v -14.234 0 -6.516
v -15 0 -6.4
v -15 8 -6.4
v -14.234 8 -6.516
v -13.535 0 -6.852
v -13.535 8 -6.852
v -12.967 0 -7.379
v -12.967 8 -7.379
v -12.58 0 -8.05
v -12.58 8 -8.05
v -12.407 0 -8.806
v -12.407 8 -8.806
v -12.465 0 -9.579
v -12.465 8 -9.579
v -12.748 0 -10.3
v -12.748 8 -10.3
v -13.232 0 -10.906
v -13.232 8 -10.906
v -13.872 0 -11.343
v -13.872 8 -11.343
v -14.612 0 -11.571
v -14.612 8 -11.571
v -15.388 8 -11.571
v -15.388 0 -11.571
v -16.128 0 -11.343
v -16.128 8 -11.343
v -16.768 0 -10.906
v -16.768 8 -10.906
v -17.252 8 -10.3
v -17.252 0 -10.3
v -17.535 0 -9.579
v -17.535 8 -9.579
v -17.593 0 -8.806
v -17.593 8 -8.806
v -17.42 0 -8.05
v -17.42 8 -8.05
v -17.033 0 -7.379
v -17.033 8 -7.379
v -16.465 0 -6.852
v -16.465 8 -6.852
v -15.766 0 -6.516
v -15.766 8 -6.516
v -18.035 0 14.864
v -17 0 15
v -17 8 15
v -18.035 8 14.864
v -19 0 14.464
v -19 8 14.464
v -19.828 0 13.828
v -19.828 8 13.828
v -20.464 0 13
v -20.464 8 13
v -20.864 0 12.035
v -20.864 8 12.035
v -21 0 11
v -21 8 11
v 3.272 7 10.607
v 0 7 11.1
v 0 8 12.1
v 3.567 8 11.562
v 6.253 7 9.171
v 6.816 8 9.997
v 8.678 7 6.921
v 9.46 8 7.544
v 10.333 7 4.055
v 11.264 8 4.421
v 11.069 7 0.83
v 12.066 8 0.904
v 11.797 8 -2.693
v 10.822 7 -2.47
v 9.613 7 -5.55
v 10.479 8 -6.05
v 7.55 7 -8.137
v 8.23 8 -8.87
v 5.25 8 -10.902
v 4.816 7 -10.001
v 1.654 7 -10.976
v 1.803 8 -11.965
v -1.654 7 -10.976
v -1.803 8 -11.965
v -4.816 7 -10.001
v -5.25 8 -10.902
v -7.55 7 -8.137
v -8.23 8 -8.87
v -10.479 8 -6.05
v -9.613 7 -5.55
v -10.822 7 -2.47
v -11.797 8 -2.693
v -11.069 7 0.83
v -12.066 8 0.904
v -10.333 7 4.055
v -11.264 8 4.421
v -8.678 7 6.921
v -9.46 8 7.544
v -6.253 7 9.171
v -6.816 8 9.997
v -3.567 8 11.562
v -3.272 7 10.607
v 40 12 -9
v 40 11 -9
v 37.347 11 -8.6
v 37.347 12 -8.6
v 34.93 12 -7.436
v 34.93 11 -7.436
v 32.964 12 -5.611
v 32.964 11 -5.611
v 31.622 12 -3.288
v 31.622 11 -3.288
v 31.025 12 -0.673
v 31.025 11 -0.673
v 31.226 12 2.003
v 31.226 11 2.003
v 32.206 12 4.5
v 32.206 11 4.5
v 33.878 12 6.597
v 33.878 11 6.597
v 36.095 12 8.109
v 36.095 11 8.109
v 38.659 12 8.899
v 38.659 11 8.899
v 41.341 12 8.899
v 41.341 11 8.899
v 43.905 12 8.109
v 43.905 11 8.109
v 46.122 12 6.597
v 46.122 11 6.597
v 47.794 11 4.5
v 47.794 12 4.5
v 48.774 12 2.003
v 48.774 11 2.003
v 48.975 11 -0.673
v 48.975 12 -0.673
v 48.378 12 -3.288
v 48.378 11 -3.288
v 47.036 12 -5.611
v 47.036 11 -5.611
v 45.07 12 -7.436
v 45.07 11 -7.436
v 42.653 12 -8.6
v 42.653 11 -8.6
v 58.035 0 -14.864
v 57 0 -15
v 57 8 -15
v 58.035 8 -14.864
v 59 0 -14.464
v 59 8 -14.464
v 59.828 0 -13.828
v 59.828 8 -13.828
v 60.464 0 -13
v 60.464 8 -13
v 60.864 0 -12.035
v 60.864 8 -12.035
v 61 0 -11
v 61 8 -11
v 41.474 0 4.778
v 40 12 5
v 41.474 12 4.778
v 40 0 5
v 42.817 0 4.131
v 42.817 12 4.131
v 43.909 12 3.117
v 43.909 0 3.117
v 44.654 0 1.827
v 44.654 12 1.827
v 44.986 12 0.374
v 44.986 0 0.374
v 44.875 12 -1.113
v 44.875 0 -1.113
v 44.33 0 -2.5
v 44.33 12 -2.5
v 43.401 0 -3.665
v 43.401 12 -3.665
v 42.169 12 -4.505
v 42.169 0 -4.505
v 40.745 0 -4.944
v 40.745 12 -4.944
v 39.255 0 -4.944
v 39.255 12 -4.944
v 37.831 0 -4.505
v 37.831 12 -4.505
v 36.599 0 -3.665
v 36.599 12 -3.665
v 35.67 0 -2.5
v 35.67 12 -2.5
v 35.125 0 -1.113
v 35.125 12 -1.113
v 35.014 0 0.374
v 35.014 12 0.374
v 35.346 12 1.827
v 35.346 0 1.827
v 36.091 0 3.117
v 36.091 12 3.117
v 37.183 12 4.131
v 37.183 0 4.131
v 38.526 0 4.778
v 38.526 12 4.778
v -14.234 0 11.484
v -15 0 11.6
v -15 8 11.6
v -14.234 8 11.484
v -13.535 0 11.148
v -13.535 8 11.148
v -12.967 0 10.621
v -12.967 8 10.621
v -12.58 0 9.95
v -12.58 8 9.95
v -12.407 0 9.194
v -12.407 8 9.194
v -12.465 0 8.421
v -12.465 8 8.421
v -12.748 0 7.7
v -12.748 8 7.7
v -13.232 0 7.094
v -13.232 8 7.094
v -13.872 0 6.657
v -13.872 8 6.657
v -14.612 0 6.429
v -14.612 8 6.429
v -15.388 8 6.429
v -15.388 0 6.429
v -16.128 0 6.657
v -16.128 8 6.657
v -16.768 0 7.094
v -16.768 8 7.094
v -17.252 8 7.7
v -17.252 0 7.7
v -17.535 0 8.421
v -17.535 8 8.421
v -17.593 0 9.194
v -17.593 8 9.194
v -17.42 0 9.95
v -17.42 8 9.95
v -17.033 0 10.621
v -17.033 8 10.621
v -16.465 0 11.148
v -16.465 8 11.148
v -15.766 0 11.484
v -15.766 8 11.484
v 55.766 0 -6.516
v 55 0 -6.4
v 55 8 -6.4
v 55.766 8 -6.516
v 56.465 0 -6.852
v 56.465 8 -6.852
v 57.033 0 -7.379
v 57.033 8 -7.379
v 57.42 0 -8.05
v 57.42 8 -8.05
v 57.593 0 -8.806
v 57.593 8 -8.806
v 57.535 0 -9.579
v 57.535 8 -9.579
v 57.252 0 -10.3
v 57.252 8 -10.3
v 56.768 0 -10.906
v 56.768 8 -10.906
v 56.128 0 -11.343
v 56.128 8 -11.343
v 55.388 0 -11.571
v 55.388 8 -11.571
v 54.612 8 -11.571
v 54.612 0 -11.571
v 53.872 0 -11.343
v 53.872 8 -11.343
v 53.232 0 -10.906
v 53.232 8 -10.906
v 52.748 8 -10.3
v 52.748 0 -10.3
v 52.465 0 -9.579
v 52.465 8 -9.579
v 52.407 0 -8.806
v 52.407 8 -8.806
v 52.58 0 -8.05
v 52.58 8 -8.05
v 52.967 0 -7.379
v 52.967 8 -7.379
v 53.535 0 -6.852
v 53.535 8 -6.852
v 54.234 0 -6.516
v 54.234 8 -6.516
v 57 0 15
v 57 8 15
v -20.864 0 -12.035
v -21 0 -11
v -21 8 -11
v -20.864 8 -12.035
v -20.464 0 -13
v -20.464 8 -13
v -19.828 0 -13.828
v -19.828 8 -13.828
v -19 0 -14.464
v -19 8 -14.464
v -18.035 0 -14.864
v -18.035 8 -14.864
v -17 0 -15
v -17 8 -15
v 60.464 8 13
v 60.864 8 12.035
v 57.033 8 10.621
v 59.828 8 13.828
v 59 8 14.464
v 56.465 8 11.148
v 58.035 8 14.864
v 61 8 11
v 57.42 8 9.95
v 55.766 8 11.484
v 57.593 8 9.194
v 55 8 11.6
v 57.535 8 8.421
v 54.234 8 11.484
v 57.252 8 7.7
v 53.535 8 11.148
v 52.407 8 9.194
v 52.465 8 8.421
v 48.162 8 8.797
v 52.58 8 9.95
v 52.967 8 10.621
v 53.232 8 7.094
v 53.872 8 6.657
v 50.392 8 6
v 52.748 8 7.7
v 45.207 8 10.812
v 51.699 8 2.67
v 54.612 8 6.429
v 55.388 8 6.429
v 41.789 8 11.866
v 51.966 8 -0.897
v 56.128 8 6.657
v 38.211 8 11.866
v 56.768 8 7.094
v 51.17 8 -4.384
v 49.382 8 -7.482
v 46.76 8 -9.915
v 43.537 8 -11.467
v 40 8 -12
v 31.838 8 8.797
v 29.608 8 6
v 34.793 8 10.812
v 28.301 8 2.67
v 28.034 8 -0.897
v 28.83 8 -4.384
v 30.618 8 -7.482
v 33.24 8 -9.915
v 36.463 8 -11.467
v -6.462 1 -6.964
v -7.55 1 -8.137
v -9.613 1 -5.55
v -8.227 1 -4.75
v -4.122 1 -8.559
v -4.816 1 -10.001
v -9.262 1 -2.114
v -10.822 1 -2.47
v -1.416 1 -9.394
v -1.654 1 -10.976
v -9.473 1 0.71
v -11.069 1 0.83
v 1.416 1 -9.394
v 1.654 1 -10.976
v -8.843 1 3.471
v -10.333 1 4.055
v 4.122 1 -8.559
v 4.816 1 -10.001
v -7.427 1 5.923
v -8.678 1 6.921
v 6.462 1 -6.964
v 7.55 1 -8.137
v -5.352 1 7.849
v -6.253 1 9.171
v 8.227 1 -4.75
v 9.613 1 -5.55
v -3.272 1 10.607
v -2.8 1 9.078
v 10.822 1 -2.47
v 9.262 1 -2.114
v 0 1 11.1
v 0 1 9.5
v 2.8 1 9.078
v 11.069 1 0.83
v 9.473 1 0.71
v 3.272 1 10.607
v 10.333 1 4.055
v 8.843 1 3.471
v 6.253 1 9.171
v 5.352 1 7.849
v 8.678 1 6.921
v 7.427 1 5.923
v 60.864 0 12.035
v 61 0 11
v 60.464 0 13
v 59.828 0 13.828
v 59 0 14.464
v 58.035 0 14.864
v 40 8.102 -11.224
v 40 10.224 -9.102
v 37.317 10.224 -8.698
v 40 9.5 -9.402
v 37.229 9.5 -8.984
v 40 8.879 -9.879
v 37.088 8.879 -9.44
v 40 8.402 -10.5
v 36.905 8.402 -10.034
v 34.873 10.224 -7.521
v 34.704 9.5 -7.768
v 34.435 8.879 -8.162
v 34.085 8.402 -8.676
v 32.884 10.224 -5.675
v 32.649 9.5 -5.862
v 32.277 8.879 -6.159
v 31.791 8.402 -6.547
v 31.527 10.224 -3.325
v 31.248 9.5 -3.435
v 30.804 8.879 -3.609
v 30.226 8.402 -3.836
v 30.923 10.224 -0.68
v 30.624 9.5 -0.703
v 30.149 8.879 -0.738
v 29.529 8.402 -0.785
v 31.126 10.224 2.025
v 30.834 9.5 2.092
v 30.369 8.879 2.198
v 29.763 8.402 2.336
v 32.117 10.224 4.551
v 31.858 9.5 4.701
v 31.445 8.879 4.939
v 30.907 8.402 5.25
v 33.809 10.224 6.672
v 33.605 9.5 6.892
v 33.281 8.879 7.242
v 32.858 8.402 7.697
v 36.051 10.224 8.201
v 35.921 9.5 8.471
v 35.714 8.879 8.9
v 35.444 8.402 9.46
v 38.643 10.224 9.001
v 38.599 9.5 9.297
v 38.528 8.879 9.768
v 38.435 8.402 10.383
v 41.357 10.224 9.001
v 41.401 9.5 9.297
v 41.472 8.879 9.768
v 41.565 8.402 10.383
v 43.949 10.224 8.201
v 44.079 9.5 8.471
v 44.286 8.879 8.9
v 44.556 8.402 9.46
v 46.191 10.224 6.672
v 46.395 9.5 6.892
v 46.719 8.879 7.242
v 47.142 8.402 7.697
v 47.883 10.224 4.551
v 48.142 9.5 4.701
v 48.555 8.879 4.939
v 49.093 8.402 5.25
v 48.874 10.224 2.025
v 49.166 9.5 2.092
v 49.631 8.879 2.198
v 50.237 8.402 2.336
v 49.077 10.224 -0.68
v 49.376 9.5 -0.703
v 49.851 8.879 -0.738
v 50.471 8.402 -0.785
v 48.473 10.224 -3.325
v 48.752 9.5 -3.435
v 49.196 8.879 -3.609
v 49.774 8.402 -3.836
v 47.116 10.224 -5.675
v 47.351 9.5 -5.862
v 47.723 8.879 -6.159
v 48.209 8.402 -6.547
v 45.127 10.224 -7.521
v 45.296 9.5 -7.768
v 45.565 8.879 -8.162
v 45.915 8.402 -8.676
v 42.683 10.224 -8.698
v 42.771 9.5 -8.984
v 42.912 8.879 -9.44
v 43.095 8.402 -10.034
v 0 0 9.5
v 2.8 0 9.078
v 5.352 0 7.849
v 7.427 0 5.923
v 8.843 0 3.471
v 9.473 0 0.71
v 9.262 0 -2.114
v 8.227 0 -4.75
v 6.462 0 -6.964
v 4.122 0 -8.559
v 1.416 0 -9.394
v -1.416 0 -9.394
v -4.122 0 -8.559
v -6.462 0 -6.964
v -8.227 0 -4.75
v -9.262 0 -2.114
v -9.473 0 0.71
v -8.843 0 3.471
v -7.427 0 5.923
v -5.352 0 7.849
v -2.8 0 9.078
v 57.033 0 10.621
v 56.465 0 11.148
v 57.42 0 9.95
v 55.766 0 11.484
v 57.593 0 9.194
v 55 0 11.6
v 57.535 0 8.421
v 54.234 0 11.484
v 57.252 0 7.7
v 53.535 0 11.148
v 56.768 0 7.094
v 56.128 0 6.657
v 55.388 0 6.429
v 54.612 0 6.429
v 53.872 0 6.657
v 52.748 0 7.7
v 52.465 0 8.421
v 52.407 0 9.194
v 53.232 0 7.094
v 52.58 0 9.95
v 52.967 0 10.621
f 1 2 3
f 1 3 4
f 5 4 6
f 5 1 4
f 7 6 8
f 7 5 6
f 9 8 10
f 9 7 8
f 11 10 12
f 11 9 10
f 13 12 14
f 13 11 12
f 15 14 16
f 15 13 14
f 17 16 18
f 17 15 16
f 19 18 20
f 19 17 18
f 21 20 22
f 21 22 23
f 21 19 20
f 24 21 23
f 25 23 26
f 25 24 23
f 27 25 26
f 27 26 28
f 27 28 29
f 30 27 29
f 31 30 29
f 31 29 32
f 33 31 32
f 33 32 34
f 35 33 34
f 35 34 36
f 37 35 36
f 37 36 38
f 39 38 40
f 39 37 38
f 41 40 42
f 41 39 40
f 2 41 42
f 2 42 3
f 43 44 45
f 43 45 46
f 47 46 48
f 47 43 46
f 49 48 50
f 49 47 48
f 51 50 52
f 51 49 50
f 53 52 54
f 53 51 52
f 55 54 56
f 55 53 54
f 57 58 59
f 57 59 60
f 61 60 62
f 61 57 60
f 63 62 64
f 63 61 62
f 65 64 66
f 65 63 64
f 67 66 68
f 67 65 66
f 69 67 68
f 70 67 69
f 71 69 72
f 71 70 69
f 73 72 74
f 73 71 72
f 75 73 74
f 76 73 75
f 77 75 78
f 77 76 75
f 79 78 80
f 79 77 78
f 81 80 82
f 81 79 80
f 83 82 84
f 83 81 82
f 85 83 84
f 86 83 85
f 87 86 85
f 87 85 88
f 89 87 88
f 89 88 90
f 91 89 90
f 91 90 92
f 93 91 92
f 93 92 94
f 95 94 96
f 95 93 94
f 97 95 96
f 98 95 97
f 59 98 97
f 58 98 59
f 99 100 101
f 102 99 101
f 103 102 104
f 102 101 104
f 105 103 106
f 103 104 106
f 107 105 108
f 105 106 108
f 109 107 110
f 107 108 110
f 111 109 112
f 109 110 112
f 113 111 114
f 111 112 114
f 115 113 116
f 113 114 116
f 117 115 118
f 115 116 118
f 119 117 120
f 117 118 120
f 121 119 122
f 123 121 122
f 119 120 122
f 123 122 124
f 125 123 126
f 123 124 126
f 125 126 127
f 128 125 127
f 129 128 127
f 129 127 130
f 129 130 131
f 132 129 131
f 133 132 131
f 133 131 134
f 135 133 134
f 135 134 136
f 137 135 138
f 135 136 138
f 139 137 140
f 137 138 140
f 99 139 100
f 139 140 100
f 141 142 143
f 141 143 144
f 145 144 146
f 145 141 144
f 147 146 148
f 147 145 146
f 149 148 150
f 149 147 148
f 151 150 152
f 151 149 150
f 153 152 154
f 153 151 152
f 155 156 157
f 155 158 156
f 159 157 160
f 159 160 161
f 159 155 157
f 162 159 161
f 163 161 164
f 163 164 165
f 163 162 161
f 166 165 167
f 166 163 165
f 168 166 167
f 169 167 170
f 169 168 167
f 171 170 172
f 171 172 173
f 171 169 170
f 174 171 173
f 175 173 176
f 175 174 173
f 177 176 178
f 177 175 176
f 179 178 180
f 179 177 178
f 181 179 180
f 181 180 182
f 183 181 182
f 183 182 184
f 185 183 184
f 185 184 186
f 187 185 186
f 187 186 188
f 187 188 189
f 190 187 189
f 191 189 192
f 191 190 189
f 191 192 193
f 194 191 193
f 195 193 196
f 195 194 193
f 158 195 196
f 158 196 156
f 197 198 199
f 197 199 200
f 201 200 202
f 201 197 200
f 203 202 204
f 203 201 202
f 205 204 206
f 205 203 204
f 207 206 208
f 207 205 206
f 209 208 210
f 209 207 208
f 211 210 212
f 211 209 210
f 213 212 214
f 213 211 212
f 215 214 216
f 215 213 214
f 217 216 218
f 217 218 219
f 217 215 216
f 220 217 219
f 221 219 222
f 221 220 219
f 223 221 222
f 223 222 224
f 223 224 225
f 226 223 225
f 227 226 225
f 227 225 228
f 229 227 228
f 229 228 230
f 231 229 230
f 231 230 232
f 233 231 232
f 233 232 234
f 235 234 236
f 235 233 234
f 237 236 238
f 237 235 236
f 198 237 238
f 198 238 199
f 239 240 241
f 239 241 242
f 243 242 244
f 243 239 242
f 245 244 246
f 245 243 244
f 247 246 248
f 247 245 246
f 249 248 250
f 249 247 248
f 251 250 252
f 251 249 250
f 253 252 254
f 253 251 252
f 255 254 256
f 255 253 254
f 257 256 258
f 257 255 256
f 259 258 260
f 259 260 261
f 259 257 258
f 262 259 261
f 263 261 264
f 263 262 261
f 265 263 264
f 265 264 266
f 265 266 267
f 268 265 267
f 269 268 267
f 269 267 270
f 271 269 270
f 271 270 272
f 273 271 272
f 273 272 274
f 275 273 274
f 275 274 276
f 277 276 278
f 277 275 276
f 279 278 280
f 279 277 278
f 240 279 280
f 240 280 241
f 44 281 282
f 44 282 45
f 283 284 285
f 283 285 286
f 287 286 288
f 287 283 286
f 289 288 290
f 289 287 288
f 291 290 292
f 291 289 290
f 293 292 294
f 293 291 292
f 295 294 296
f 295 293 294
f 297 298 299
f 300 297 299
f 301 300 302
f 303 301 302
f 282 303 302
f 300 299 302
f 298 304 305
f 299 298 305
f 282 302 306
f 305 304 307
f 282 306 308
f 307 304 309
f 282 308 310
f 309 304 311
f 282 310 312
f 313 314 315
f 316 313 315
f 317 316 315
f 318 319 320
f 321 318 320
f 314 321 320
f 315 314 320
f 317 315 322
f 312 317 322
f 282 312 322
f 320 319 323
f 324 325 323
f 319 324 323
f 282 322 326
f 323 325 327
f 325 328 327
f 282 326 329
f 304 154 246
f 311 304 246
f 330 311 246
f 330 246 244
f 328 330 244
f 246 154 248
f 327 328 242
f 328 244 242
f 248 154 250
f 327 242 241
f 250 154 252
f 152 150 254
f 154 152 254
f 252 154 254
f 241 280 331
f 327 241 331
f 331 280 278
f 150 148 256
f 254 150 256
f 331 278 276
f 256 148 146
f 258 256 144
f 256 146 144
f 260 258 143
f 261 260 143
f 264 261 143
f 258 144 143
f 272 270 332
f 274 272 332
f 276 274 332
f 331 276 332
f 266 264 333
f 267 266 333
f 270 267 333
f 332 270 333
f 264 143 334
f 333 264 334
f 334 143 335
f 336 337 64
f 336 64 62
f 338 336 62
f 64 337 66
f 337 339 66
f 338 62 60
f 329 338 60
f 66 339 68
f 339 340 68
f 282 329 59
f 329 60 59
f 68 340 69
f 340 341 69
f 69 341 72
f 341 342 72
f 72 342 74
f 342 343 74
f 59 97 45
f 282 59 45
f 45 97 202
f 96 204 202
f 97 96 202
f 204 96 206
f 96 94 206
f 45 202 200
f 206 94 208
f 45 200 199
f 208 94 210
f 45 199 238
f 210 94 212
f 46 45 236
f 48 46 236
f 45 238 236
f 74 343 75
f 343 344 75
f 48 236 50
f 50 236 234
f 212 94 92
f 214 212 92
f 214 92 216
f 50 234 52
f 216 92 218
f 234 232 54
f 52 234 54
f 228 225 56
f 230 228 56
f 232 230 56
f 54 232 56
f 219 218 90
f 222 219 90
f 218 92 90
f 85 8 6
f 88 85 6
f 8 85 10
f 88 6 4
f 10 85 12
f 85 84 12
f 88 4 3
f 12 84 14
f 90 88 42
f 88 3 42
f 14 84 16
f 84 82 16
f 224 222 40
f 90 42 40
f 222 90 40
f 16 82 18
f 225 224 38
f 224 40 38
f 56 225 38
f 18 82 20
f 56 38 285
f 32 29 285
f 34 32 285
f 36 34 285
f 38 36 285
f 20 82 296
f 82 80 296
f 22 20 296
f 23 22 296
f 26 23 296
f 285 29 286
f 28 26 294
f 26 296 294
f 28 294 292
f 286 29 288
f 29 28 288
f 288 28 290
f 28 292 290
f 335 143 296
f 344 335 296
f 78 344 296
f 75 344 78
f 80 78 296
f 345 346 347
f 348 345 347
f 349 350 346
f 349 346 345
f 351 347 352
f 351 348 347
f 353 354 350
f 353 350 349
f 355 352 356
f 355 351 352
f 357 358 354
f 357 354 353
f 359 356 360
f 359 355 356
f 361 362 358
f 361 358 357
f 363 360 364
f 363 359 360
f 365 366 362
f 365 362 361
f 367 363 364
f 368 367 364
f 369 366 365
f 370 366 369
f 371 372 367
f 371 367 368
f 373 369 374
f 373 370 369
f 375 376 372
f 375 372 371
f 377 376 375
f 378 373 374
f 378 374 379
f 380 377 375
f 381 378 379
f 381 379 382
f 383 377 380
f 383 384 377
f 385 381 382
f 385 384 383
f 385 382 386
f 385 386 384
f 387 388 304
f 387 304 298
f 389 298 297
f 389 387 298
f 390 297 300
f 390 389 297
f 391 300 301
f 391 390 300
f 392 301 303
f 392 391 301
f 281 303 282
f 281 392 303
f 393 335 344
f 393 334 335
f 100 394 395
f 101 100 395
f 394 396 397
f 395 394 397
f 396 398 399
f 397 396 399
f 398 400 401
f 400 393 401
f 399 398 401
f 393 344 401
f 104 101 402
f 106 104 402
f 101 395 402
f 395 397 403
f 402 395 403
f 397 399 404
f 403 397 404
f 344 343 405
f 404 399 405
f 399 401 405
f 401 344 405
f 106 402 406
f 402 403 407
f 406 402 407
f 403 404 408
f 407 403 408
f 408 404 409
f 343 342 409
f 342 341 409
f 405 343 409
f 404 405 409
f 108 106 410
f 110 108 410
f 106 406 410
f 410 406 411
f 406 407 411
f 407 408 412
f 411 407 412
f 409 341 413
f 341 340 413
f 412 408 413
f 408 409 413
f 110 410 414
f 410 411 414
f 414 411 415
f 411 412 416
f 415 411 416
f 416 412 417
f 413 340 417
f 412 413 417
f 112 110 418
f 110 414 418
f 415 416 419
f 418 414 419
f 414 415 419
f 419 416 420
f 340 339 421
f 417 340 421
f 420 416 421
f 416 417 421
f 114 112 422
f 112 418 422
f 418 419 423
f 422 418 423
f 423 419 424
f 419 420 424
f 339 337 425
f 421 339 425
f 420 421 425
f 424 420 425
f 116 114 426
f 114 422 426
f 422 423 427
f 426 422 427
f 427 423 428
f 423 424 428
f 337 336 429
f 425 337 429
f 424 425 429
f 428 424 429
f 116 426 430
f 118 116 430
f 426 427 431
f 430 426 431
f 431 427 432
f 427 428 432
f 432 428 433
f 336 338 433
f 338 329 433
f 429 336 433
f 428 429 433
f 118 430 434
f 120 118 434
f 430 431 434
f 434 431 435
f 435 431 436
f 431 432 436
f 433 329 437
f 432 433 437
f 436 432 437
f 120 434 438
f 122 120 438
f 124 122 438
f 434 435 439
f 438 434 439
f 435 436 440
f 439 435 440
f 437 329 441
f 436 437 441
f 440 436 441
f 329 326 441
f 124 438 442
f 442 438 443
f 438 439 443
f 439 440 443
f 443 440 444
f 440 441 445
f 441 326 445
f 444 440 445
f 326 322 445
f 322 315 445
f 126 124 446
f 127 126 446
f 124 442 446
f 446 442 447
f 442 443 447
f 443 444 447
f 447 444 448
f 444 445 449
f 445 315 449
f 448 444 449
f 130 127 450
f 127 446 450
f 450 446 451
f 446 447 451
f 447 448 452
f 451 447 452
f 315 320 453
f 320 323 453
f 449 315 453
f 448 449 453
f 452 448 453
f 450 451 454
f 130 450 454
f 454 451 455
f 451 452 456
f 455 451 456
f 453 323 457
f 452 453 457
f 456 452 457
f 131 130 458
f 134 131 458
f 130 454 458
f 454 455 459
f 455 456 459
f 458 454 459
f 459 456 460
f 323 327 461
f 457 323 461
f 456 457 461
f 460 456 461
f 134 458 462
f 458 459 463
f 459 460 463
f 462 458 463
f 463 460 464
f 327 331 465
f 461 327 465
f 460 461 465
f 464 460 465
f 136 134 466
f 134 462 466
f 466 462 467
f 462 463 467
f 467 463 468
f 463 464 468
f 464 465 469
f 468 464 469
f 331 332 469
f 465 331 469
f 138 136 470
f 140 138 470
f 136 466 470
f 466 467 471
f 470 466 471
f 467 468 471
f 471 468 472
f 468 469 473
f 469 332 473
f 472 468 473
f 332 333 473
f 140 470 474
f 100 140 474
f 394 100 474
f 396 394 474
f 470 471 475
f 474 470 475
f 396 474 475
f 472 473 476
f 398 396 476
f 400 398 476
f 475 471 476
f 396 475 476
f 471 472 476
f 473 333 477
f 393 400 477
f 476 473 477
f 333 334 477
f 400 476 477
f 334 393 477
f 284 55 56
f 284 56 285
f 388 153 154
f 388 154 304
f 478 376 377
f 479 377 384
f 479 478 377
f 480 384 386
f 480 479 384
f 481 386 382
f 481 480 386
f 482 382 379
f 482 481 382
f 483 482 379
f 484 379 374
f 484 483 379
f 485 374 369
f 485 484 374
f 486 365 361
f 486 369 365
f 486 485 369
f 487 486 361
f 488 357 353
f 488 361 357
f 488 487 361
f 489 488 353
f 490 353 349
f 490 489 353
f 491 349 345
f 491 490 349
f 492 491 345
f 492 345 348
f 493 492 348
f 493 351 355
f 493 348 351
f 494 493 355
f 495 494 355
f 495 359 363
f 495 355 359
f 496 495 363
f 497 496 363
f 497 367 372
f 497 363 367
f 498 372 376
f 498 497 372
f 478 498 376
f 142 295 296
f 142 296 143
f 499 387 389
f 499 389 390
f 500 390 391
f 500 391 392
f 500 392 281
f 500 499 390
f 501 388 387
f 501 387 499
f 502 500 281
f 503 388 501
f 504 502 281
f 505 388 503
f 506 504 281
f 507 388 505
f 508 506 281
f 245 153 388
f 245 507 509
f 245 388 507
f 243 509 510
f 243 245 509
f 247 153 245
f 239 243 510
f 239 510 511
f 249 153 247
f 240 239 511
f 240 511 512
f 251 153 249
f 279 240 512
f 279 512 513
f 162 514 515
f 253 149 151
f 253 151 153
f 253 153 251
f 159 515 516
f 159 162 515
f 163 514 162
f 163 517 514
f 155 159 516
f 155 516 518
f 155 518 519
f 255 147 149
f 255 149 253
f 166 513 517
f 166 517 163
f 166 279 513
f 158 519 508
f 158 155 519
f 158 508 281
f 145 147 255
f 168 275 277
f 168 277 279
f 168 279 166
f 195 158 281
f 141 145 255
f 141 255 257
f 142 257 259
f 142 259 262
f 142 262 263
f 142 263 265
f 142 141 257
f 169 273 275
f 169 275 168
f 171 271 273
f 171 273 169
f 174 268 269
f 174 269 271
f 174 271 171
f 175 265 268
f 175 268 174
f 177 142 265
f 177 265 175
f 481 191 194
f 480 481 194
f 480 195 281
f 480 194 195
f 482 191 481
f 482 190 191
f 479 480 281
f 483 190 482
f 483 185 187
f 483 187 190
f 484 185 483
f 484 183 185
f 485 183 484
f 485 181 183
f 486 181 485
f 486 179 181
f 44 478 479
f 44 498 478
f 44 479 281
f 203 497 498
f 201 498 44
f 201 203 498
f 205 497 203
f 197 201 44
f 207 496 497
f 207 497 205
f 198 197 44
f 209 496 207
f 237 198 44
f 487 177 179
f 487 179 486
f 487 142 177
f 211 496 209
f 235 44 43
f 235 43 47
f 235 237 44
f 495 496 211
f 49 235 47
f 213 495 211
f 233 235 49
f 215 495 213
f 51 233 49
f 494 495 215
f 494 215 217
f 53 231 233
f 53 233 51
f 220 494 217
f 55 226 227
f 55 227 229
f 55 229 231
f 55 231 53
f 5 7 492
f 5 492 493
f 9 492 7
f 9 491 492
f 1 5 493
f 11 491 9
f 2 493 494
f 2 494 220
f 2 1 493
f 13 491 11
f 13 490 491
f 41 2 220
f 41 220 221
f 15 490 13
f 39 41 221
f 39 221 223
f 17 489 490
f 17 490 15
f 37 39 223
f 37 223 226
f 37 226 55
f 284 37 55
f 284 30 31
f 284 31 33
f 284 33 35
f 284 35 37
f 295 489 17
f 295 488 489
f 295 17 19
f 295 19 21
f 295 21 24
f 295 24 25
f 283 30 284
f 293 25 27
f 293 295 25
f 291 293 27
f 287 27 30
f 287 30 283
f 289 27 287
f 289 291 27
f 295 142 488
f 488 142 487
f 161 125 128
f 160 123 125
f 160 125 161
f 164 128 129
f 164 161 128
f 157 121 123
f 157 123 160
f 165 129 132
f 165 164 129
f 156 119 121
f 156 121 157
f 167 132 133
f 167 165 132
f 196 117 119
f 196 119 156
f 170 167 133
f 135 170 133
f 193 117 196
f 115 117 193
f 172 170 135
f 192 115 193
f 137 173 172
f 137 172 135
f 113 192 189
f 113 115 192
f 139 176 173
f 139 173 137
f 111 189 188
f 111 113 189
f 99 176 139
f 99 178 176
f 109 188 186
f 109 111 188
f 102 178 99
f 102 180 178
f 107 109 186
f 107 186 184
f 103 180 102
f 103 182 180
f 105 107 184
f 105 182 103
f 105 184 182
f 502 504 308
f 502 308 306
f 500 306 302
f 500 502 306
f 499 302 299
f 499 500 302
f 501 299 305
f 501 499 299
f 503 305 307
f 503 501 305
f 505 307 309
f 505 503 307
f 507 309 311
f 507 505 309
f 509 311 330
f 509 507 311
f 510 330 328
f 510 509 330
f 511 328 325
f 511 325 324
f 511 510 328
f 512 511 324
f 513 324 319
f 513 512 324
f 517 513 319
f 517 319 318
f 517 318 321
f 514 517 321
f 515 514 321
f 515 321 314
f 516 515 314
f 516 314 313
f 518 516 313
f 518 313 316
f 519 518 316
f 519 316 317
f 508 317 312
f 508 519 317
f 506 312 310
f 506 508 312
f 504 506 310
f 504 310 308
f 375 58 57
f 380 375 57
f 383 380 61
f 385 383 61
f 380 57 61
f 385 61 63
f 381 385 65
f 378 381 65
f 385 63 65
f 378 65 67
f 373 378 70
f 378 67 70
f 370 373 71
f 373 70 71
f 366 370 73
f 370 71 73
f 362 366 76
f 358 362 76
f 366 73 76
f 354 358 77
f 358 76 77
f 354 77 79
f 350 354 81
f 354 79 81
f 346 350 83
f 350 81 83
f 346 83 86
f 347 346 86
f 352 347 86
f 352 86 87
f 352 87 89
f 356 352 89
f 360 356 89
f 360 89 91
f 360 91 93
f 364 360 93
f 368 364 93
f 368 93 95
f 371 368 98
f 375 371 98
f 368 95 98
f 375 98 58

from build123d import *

# Parameters (mm, degrees)
SKETCH1_R           = 9.5
SKETCH1_R_2         = 5
SKETCH1_R_3         = 2.6
BOSS_EXTRUDE1_DEPTH = 8
SKETCH2_R           = 11.1
CUT_EXTRUDE1_DEPTH  = 7
SKETCH3_R           = 9
SKETCH3_R_2         = 5
BOSS_EXTRUDE2_DEPTH = 4
FILLET1_R           = 3
CHAMFER1_SIZE       = 1


with BuildPart() as part:
    # Sketch1 → Boss-Extrude1 (new body)
    with BuildSketch(Plane(origin=(0, 0, 0), x_dir=(1, 0, 0), z_dir=(0, 1, 0))):
        with BuildLine():
            Line((-17, 15), (57, 15))
            ThreePointArc((57, 15), (59.828427125, 13.828427125), (61, 11))
            Line((61, 11), (61, -11))
            ThreePointArc((61, -11), (59.828427125, -13.828427125), (57, -15))
            Line((57, -15), (-17, -15))
            ThreePointArc((-17, -15), (-19.828427125, -13.828427125), (-21, -11))
            Line((-21, -11), (-21, 11))
            ThreePointArc((-21, 11), (-19.828427125, 13.828427125), (-17, 15))
        make_face()
        with Locations(Location((0, 0, 0), (0, 0, 270))):  # turned: the seam where the file's is
            Circle(SKETCH1_R, mode=Mode.SUBTRACT)
        with Locations(Location((40, 0, 0), (0, 0, 270))):  # turned: the seam where the file's is
            Circle(SKETCH1_R_2, mode=Mode.SUBTRACT)
        with Locations(Location((-15, 9, 0), (0, 0, 270))):  # turned: the seam where the file's is
            Circle(SKETCH1_R_3, mode=Mode.SUBTRACT)
        with Locations(Location((-15, -9, 0), (0, 0, 270))):  # turned: the seam where the file's is
            Circle(SKETCH1_R_3, mode=Mode.SUBTRACT)
        with Locations(Location((55, 9, 0), (0, 0, 270))):  # turned: the seam where the file's is
            Circle(SKETCH1_R_3, mode=Mode.SUBTRACT)
        with Locations(Location((55, -9, 0), (0, 0, 270))):  # turned: the seam where the file's is
            Circle(SKETCH1_R_3, mode=Mode.SUBTRACT)
    extrude(amount=BOSS_EXTRUDE1_DEPTH)

    # Sketch2 → Cut-Extrude1 (cut)
    with BuildSketch(Plane(origin=(0, 8, 0), x_dir=(1, 0, 0), z_dir=(0, 1, 0))):
        with Locations(Location((0, 0, 0), (0, 0, 270))):  # turned: the seam where the file's is
            Circle(SKETCH2_R)
    extrude(amount=-CUT_EXTRUDE1_DEPTH, mode=Mode.SUBTRACT)

    # Sketch3 → Boss-Extrude2 (add)
    with BuildSketch(Plane(origin=(0, 8, 0), x_dir=(1, 0, 0), z_dir=(0, 1, 0))):
        with Locations(Location((40, 0, 0), (0, 0, 90))):  # turned: the seam where the file's is
            Circle(SKETCH3_R)
        with Locations(Location((40, 0, 0), (0, 0, 270))):  # turned: the seam where the file's is
            Circle(SKETCH3_R_2, mode=Mode.SUBTRACT)
    extrude(amount=BOSS_EXTRUDE2_DEPTH)

    # Fillet1
    fillet1_edges = [part.edges().sort_by_distance(p)[0] for p in [
        (40, 8, 9),
    ]]
    fillet(fillet1_edges, radius=FILLET1_R)

    # Chamfer1
    chamfer1_edges = [part.edges().sort_by_distance(p)[0] for p in [
        (0, 8, -11.1),
    ]]
    chamfer(chamfer1_edges, length=CHAMFER1_SIZE)


solid = part.part
